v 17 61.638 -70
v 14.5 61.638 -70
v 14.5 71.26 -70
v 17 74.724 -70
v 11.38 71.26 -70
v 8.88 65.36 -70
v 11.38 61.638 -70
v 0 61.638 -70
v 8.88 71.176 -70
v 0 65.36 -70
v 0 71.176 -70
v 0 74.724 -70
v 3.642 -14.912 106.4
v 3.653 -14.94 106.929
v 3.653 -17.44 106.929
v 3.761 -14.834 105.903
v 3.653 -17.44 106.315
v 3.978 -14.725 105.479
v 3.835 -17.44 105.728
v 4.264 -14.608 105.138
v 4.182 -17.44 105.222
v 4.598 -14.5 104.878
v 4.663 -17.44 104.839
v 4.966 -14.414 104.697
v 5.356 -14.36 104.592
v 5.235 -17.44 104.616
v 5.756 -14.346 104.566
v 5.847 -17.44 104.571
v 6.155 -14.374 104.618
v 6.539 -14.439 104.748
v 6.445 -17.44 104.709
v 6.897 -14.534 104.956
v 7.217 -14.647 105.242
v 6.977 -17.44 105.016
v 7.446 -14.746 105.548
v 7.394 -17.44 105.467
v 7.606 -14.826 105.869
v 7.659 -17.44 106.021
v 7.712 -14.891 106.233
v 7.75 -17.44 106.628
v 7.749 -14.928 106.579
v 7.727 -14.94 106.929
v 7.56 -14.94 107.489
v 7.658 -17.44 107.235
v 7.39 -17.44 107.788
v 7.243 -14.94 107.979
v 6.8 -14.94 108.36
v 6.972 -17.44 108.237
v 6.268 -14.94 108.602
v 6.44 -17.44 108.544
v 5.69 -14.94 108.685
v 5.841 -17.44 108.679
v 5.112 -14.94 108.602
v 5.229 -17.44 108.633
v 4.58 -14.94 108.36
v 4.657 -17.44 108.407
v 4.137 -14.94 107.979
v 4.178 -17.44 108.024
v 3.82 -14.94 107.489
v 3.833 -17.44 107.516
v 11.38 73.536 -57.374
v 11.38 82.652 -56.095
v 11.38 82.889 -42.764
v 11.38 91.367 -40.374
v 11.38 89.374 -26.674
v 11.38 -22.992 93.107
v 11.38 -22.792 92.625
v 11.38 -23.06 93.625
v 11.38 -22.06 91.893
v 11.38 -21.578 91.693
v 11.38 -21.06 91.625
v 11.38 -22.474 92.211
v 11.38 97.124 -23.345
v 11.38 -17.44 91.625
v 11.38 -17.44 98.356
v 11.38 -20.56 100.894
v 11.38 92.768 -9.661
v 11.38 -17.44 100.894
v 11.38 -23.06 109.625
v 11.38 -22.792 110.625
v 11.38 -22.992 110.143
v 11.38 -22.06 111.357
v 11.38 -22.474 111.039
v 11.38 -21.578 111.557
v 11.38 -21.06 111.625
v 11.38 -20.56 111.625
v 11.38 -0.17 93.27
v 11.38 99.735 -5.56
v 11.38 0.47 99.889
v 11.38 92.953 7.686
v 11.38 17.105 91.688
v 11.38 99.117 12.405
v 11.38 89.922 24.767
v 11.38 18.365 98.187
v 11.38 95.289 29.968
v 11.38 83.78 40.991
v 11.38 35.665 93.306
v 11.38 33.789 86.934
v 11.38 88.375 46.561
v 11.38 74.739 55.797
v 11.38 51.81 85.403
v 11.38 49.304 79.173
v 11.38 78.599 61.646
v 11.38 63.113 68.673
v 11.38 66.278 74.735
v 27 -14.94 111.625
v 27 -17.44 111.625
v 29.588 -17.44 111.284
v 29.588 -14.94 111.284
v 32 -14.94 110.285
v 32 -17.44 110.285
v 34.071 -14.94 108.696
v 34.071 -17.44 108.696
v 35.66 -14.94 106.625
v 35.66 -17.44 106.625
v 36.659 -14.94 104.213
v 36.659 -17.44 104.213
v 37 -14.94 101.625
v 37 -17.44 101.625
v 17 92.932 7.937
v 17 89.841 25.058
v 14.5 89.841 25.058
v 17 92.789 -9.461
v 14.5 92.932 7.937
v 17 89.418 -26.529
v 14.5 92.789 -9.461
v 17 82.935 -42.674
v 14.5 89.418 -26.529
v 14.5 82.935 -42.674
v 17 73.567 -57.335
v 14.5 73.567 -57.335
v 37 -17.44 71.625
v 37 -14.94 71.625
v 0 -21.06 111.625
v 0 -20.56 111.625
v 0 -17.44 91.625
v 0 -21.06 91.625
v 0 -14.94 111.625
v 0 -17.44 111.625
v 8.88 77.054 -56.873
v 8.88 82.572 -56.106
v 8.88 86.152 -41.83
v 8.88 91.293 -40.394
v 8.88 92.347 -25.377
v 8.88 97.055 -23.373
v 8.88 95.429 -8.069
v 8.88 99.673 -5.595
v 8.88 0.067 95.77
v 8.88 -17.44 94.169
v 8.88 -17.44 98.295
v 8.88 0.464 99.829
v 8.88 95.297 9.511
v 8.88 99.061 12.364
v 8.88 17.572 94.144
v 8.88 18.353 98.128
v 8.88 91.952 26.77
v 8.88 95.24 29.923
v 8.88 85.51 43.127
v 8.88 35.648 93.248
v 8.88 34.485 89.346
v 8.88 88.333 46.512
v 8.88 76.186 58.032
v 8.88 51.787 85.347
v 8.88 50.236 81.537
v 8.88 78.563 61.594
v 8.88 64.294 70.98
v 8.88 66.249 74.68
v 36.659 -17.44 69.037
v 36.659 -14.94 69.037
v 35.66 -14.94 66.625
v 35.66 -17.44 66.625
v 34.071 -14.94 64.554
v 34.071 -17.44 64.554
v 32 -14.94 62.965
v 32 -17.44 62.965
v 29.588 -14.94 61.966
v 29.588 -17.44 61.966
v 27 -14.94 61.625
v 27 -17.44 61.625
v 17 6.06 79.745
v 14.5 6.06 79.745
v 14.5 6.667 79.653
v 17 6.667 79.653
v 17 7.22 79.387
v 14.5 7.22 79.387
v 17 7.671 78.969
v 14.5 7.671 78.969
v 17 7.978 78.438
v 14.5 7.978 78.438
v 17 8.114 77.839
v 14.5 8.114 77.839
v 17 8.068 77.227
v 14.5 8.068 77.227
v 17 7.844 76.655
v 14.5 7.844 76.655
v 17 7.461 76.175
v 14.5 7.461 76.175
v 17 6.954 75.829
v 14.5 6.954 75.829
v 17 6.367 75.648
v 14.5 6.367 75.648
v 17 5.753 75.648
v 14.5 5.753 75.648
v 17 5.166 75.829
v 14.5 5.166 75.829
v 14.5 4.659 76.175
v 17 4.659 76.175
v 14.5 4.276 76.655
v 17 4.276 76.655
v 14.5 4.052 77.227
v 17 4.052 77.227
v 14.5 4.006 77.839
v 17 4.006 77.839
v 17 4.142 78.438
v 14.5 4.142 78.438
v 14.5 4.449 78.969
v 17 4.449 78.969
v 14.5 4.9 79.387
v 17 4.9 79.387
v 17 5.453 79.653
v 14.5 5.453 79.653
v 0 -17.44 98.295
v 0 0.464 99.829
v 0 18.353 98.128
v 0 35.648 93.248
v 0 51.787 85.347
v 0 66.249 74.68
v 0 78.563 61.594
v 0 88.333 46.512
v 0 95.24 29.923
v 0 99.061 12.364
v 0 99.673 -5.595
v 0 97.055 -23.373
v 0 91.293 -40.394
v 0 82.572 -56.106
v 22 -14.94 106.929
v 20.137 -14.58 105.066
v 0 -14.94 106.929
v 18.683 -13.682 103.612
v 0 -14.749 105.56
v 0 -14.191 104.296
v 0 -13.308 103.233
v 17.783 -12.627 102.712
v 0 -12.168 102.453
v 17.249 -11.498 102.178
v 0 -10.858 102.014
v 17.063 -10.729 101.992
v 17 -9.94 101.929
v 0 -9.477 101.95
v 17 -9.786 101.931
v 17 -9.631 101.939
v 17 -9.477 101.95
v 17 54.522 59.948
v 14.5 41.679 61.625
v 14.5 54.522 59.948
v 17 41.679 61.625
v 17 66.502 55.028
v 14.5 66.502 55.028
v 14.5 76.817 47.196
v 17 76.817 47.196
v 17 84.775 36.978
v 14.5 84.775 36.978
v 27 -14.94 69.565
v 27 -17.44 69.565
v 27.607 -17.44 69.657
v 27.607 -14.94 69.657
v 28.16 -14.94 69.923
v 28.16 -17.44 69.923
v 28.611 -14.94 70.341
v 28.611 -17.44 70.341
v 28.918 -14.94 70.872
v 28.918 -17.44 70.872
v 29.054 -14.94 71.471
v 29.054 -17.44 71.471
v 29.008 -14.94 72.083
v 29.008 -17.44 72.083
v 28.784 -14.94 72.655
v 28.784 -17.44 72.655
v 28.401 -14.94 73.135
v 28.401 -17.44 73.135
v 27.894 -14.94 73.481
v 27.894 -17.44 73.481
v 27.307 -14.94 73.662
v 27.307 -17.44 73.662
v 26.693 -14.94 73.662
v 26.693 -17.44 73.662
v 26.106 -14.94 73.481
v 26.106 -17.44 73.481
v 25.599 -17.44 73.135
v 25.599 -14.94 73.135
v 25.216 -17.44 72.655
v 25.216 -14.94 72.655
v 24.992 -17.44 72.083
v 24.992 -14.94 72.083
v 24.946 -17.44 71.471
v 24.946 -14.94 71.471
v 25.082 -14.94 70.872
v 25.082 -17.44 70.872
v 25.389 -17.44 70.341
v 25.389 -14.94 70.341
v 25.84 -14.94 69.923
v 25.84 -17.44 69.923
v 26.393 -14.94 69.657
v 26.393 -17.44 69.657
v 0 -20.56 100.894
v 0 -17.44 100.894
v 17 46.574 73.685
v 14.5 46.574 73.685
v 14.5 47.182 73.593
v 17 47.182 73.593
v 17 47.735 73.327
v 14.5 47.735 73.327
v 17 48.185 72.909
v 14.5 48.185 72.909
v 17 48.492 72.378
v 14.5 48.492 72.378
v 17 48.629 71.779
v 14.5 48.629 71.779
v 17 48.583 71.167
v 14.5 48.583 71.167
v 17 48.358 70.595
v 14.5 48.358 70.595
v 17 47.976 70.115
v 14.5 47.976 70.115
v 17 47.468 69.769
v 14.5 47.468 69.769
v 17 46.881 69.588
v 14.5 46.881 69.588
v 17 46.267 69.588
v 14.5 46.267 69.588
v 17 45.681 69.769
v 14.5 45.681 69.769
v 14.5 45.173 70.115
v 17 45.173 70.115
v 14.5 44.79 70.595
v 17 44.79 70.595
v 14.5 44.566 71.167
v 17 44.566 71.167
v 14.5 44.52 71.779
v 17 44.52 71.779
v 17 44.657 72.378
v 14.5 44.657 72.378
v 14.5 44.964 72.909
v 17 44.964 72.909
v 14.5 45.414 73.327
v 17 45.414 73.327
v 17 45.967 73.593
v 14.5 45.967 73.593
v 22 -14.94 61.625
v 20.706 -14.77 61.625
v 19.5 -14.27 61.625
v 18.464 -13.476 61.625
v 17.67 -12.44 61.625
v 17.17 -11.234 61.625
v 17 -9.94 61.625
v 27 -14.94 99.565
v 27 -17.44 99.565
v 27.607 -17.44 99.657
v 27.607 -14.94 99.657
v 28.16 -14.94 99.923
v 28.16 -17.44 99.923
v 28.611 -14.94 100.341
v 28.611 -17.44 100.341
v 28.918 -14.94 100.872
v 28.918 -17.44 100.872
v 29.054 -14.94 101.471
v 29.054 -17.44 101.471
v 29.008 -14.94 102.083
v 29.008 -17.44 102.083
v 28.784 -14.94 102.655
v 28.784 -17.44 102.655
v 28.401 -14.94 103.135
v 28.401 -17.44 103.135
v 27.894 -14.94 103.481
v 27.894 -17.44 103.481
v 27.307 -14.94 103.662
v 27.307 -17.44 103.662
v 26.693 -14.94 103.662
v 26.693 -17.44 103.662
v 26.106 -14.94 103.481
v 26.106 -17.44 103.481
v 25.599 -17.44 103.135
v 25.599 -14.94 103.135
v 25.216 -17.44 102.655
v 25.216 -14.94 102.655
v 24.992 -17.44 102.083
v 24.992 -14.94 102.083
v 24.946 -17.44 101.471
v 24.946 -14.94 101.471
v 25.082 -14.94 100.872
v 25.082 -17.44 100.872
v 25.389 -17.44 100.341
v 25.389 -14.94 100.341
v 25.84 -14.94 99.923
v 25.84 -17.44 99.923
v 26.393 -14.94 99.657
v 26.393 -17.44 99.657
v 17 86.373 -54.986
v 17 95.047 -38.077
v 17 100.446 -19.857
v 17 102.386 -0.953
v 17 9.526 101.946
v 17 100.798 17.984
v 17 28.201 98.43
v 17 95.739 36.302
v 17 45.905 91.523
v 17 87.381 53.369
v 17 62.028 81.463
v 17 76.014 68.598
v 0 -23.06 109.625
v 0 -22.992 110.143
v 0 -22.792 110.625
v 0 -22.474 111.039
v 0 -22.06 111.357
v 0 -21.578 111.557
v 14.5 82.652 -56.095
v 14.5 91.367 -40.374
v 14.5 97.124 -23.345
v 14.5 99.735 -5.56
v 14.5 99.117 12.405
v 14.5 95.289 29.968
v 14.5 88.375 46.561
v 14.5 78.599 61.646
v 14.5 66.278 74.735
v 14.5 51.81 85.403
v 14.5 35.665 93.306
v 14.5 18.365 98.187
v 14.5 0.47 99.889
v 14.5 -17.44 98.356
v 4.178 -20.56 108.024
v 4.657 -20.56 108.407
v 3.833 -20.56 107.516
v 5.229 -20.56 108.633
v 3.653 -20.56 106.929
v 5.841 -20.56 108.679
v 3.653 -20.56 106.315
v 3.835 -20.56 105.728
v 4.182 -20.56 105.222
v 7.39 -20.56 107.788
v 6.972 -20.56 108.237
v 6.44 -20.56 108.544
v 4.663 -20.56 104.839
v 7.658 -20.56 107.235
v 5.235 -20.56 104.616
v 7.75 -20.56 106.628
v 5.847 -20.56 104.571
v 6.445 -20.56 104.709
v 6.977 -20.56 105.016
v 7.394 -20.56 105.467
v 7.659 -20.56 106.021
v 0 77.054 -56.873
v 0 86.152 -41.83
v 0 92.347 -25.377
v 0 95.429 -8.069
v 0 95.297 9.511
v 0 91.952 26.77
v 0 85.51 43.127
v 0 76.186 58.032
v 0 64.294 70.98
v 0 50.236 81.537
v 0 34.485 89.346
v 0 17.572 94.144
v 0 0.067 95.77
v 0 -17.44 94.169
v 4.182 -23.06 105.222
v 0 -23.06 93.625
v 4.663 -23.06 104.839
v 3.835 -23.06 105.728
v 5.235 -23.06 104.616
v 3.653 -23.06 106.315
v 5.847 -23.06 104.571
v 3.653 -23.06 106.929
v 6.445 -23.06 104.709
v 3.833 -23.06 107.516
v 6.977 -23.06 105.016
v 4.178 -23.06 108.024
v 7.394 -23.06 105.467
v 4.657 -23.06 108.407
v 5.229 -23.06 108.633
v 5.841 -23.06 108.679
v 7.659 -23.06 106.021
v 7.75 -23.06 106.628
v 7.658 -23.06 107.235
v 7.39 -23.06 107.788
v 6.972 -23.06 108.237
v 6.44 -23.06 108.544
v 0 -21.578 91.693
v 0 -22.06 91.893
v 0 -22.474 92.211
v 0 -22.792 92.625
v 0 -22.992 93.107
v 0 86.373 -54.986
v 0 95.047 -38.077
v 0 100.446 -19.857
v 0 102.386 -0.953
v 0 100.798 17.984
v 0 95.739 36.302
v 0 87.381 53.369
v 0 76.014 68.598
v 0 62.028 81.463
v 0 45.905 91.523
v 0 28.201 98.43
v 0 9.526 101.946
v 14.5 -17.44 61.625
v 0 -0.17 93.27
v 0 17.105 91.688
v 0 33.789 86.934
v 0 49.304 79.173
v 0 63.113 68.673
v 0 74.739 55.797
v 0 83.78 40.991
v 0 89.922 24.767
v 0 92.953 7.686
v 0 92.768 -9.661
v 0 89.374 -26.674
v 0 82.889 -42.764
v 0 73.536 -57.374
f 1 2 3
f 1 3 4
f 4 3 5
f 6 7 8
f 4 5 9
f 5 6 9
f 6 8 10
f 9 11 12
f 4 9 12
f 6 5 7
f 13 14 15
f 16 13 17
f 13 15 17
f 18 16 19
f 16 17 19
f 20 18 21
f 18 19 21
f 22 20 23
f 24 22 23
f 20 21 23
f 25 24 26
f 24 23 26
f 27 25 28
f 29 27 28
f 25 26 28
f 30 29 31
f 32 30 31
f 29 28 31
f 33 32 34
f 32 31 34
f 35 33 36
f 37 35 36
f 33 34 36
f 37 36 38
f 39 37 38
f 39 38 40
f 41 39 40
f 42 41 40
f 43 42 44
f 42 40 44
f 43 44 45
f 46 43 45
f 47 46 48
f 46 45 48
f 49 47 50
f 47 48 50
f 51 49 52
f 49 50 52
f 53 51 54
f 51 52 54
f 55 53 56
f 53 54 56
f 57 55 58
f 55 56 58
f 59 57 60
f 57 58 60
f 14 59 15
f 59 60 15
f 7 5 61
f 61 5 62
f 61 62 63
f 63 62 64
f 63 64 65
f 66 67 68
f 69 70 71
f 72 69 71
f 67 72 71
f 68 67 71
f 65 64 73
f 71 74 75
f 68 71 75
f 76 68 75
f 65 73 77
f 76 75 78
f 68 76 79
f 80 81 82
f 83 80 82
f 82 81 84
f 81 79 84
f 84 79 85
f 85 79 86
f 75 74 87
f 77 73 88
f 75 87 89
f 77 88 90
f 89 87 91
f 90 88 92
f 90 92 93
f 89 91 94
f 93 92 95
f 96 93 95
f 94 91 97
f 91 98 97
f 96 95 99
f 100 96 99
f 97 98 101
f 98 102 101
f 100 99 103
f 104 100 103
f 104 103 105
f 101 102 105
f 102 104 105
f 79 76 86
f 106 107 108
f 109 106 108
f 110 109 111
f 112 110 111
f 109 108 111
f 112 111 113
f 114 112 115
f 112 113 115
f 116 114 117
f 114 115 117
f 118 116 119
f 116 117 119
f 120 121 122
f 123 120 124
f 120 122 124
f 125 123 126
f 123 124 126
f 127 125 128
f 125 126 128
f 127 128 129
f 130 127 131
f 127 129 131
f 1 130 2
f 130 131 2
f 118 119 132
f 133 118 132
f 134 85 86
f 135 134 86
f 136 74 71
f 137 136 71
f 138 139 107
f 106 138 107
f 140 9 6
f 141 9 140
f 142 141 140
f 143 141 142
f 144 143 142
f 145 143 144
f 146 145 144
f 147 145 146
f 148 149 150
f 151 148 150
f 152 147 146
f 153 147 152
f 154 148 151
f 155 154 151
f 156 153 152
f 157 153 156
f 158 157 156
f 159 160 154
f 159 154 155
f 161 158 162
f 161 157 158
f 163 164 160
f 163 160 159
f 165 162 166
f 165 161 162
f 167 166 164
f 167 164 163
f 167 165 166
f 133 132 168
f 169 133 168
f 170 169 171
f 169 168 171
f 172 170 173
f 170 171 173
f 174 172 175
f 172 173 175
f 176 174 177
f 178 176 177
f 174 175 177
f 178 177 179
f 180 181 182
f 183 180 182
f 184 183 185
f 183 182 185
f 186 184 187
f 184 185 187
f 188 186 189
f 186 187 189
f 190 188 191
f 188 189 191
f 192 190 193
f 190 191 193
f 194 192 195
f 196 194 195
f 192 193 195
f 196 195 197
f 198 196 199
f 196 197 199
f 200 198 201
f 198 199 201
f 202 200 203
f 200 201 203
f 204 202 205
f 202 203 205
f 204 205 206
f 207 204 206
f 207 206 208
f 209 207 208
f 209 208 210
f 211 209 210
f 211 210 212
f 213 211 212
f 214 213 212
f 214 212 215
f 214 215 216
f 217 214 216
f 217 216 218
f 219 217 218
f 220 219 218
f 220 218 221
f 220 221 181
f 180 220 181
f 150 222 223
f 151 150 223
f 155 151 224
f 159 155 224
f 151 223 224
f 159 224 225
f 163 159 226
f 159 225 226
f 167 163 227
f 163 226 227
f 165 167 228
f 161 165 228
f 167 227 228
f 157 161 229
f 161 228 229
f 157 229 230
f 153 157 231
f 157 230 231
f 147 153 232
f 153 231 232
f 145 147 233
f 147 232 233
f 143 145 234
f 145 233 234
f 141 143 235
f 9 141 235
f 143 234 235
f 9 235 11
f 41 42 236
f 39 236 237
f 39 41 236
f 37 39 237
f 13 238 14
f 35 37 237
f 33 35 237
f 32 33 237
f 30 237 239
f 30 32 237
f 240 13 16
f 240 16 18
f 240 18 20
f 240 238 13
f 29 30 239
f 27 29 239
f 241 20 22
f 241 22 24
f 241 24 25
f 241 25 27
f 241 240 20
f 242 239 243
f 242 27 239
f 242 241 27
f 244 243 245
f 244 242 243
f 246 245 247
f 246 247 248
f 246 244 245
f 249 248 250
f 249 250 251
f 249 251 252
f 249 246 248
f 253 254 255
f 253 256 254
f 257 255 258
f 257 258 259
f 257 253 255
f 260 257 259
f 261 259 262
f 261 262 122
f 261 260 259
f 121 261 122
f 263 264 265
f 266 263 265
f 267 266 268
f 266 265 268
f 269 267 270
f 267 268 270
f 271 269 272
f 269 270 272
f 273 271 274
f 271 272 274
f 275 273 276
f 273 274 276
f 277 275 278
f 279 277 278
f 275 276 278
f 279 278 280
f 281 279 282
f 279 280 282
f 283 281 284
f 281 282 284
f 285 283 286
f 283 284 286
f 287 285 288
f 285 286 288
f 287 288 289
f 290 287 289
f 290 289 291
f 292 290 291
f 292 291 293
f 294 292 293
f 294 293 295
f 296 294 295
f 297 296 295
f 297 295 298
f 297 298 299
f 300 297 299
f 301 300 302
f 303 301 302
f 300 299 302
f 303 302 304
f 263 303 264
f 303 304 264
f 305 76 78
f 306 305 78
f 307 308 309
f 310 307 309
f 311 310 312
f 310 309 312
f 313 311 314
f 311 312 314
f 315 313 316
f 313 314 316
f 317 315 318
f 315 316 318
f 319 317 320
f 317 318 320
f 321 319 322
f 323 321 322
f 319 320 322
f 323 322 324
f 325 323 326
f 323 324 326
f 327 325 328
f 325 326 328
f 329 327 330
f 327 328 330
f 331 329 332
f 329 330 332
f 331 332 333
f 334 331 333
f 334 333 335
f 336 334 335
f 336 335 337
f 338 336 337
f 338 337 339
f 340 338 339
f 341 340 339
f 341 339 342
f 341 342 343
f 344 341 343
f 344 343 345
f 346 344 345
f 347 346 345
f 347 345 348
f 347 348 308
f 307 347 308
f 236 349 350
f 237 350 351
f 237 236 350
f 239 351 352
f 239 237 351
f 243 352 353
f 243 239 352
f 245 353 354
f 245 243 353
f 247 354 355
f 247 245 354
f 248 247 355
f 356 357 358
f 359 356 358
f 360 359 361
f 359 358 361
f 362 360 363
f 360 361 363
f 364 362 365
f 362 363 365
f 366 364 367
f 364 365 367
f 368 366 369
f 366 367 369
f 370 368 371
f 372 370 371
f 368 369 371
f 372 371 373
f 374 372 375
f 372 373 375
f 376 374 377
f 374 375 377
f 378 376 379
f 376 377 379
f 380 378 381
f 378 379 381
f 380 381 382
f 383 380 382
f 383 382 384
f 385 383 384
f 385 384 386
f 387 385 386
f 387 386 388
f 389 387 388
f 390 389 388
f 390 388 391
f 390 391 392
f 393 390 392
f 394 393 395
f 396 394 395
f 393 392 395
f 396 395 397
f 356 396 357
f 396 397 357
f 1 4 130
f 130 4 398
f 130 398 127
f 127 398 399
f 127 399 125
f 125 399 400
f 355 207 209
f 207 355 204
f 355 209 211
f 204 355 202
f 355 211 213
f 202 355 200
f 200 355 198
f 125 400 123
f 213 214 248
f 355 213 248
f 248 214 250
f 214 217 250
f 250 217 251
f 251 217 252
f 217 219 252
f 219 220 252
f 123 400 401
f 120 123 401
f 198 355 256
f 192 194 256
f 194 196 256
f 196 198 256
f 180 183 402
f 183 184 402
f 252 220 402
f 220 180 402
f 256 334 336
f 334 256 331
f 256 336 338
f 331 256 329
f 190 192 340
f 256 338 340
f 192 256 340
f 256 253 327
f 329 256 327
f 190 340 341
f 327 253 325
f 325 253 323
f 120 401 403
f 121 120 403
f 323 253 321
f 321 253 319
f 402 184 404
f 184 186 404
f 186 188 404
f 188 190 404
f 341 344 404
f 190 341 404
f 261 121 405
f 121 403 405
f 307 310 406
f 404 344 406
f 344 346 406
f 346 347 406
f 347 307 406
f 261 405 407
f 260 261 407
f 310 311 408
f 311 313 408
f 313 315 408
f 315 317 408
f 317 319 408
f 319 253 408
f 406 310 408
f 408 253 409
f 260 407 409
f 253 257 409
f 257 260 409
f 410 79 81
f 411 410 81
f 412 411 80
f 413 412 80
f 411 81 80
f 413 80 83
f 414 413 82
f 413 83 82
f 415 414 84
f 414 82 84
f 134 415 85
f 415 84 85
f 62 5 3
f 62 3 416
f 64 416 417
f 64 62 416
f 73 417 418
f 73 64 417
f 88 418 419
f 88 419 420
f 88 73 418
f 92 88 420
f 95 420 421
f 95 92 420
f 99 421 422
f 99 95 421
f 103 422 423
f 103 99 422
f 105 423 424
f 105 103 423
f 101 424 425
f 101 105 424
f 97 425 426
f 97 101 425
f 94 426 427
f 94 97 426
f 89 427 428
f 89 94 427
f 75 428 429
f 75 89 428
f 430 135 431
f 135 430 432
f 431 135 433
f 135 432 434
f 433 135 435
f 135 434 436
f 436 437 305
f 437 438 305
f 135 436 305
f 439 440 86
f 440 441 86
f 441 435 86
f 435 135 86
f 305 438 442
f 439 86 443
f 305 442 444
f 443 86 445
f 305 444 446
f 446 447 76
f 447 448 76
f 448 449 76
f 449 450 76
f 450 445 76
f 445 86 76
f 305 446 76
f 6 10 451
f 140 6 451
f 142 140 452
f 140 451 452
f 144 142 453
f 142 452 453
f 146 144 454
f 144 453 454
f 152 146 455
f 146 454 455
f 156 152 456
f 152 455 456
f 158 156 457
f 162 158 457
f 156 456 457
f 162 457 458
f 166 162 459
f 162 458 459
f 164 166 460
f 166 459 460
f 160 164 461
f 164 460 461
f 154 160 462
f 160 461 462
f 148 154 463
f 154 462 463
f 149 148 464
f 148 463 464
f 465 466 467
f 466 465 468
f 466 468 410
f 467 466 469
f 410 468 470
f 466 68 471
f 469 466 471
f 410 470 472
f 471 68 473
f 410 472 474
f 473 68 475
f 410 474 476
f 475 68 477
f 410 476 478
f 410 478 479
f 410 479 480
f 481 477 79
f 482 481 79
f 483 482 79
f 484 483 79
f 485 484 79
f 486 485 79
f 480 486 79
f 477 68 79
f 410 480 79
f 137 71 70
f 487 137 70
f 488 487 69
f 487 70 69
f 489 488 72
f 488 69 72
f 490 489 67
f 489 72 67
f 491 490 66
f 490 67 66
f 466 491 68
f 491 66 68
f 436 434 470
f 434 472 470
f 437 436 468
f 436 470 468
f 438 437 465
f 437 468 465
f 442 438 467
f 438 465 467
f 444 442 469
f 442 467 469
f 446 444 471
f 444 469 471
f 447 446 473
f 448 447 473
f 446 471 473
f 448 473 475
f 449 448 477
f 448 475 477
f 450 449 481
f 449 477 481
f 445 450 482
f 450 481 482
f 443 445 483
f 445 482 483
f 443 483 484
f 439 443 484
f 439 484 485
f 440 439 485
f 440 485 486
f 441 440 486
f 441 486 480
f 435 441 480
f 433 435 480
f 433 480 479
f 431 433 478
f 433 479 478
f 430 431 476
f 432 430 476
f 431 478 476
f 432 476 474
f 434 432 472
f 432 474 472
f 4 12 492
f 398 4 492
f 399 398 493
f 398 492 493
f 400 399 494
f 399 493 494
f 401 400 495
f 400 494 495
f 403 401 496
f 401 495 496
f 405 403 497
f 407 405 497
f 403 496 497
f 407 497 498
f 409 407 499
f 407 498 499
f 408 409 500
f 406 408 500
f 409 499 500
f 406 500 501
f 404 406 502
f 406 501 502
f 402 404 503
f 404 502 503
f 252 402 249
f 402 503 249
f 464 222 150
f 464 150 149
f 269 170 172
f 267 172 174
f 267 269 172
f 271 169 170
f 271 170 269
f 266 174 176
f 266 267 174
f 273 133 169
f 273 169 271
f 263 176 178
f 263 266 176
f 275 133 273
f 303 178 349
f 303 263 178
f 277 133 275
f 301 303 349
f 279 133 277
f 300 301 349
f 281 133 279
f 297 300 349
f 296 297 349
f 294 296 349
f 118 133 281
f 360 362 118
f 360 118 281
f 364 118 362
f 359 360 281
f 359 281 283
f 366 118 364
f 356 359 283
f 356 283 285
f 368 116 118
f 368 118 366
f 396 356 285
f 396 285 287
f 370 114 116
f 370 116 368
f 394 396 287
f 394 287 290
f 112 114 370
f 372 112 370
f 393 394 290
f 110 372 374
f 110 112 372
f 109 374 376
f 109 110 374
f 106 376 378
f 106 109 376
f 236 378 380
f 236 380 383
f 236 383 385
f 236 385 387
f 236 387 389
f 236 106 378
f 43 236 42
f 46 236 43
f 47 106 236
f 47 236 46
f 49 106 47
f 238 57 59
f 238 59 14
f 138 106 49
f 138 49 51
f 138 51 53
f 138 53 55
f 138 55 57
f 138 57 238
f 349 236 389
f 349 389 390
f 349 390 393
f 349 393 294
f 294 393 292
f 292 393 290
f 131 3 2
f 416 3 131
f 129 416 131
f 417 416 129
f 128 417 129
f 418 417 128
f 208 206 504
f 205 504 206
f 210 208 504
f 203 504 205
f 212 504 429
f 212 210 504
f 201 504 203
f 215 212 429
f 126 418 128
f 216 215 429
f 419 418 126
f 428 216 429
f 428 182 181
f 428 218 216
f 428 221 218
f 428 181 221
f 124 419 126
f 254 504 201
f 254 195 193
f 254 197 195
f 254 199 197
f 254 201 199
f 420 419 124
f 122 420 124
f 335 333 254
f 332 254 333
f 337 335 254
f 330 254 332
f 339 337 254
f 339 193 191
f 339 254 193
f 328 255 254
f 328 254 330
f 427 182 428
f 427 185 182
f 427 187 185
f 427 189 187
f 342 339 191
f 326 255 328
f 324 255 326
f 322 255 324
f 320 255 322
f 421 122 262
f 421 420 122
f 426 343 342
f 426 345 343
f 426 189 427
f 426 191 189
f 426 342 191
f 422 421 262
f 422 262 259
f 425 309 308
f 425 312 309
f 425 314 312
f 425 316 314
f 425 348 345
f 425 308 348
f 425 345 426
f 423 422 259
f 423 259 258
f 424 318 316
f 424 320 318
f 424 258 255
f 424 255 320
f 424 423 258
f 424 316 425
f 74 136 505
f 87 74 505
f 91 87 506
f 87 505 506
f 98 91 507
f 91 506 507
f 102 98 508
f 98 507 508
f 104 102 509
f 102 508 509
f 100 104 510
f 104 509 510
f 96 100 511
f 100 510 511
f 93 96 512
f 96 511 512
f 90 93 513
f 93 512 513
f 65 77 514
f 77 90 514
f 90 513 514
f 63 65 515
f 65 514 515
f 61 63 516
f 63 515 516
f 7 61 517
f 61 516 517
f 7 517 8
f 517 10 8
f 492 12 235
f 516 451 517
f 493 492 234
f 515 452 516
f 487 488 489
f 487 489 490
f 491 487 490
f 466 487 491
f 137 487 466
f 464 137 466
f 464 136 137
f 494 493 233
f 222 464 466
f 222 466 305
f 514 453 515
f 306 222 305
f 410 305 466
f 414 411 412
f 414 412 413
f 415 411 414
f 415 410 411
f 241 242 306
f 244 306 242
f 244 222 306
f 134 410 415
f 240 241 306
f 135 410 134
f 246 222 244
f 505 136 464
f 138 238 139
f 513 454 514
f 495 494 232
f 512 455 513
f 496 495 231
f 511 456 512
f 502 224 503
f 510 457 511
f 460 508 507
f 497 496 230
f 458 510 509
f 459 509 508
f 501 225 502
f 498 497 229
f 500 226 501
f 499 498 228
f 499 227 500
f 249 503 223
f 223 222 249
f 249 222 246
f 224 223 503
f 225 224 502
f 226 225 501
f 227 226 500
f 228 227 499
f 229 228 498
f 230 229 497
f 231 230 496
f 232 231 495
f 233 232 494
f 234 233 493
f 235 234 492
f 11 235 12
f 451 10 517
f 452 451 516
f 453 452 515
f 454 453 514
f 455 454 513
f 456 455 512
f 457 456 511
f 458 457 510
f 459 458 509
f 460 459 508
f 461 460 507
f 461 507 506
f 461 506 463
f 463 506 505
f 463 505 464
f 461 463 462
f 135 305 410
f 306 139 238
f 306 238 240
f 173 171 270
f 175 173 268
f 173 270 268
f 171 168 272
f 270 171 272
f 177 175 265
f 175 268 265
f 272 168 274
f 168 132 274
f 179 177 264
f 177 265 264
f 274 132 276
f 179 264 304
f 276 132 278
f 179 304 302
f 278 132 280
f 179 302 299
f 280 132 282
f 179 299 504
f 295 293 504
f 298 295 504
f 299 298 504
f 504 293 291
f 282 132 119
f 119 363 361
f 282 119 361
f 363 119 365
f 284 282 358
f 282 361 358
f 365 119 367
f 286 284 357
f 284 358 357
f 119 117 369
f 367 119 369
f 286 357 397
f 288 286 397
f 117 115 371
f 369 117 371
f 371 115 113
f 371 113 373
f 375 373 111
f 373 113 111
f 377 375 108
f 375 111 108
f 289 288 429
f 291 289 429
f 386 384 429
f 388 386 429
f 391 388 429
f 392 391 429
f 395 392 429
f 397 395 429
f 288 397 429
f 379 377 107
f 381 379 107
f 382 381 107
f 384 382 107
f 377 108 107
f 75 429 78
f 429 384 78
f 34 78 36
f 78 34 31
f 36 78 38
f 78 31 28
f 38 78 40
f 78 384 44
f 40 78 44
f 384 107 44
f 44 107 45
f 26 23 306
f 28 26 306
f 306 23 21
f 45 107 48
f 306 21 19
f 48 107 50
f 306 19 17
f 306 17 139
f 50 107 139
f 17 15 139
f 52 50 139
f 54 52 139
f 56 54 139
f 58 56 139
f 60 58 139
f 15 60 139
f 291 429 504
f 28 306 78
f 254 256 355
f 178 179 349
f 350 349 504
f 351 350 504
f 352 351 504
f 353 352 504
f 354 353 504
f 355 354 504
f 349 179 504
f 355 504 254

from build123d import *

# Parameters (mm, degrees)
SALIENTE_EXTRUIR1_DEPTH = 17
CORTAR_EXTRUIR1_DEPTH   = 8.88
CORTAR_EXTRUIR2_START   = -5.62
CROQUIS6_R              = 99.89
CROQUIS6_R_2            = 93.27
CORTAR_EXTRUIR2_DEPTH   = 3.12
SALIENTE_EXTRUIR3_DEPTH = 17
SALIENTE_EXTRUIR4_START = -5.62
SALIENTE_EXTRUIR4_DEPTH = 11.38
SALIENTE_EXTRUIR5_START = -2.5
SALIENTE_EXTRUIR5_DEPTH = 2.5
REDONDEO1_R             = 50
CROQUIS7_R              = 2.06
SALIENTE_EXTRUIR6_DEPTH = 2.5
REDONDEO7_R             = 5
CROQUIS8_R              = 2.06
CORTAR_EXTRUIR3_DEPTH   = 172.950113436
CROQUIS9_R              = 2.06
CORTAR_EXTRUIR4_DEPTH   = 154.134258449


with BuildPart() as part:
    # Croquis1 → Saliente-Extruir1 (new body)
    with BuildSketch(Plane(origin=(0, 0, 0), x_dir=(0, 0, -1), z_dir=(1, 0, 0))):
        with BuildLine():
            ThreePointArc((70, 74.724240378), (-48.602144929, 90.119607235), (-100.893798125, -17.44))
            Line((-100.893798125, -17.44), (-91.624992769, -17.44))
            ThreePointArc((-91.624992769, -17.44), (-40.990957413, 83.779677192), (70, 61.638404425))
            Line((70, 61.638404425), (70, 74.724240378))
        make_face()
    extrude(amount=SALIENTE_EXTRUIR1_DEPTH)

    # Croquis5 → Cortar-Extruir1 (cut)
    with BuildSketch(Plane.ZY):
        with BuildLine():
            Line((-70, 71.176041615), (-70, 65.359719247))
            ThreePointArc((-70, 65.359719247), (43.12748064, 85.509726427), (94.168674728, -17.44))
            Line((94.168674728, -17.44), (98.294838623, -17.44))
            ThreePointArc((98.294838623, -17.44), (46.5118284, 88.332772621), (-70, 71.176041615))
        make_face()
    extrude(amount=-CORTAR_EXTRUIR1_DEPTH, mode=Mode.SUBTRACT)

    # Croquis6 → Cortar-Extruir2 (cut)
    with BuildSketch(Plane(origin=(17, 0, 0), x_dir=(0, 0, -1), z_dir=(1, 0, 0)).offset(CORTAR_EXTRUIR2_START)):
        Circle(CROQUIS6_R)
        Circle(CROQUIS6_R_2, mode=Mode.SUBTRACT)
    extrude(amount=CORTAR_EXTRUIR2_DEPTH, mode=Mode.SUBTRACT)

    # Croquis2 → Saliente-Extruir3 (add, through all)
    with BuildSketch(Plane(origin=(17, 0, 0), x_dir=(0, 0, -1), z_dir=(1, 0, 0))):
        with BuildLine():
            Line((-111.624992769, -14.94), (-111.624992769, -17.44))
            Line((-111.624992769, -17.44), (-100.893798125, -17.44))
            ThreePointArc((-100.893798125, -17.44), (-101.101710796, -16.19123757), (-101.294168144, -14.94))
            Line((-101.294168144, -14.94), (-111.624992769, -14.94))
        make_face()
    extrude(amount=-SALIENTE_EXTRUIR3_DEPTH)

    # Croquis3 → Saliente-Extruir4 (add)
    with BuildSketch(Plane(origin=(17, 0, 0), x_dir=(0, 0, -1), z_dir=(1, 0, 0)).offset(SALIENTE_EXTRUIR4_START)):
        with BuildLine():
            Line((-91.624992769, -17.44), (-91.624992769, -21.06))
            ThreePointArc((-91.624992769, -21.06), (-92.210779207, -22.474213562), (-93.624992769, -23.06))
            Line((-93.624992769, -23.06), (-109.624992769, -23.06))
            ThreePointArc((-109.624992769, -23.06), (-111.039206332, -22.474213562), (-111.624992769, -21.06))
            Line((-111.624992769, -21.06), (-111.624992769, -20.56))
            Line((-111.624992769, -20.56), (-100.893798125, -20.56))
            Line((-100.893798125, -20.56), (-100.893798125, -17.44))
            Line((-100.893798125, -17.44), (-91.624992769, -17.44))
        make_face()
    extrude(amount=-SALIENTE_EXTRUIR4_DEPTH)

    # Croquis4 → Saliente-Extruir5 (add)
    with BuildSketch(Plane(origin=(17, 0, 0), x_dir=(0, 0, -1), z_dir=(1, 0, 0)).offset(SALIENTE_EXTRUIR5_START)):
        with BuildLine():
            Line((-61.624992769, 70.011807334), (-61.624992769, -17.44))
            Line((-61.624992769, -17.44), (-91.624992769, -17.44))
            ThreePointArc((-91.624992769, -17.44), (-88.223263193, 30.264644911), (-61.624992769, 70.011807334))
        make_face()
    extrude(amount=SALIENTE_EXTRUIR5_DEPTH)

    # Redondeo1
    redondeo1_edges = [part.edges().sort_by_distance(p)[0] for p in [
        (15.75, 70.011807334, 61.624992769),
    ]]
    fillet(redondeo1_edges, radius=REDONDEO1_R)

    # Croquis7 → Saliente-Extruir6 (add)
    with BuildSketch(Plane.XZ.offset(17.44)):
        with BuildLine():
            Line((17, 111.624992769), (27, 111.624992769))
            ThreePointArc((27, 111.624992769), (34.071067812, 108.696060581), (37, 101.624992769))
            Line((37, 101.624992769), (37, 71.624992769))
            ThreePointArc((37, 71.624992769), (34.071067812, 64.553924958), (27, 61.624992769))
            Line((27, 61.624992769), (17, 61.624992769))
            Line((17, 61.624992769), (17, 111.624992769))
        make_face()
        with Locations(Location((27, 101.624992769, 0), (0, 0, 270))):
            Circle(CROQUIS7_R, mode=Mode.SUBTRACT)
        with Locations(Location((27, 71.624992769, 0), (0, 0, 270))):
            Circle(CROQUIS7_R, mode=Mode.SUBTRACT)
    extrude(amount=-SALIENTE_EXTRUIR6_DEPTH)

    # Redondeo7
    redondeo7_edges = [part.edges().sort_by_distance(p)[0] for p in [
        (17, -14.94, 81.459580457),
        (8.5, -14.94, 101.294168144),
    ]]
    fillet(redondeo7_edges, radius=REDONDEO7_R)

    # Croquis8 → Cortar-Extruir3 (cut, through all)
    with BuildSketch(Plane.XZ.offset(23.06)):
        with Locations(Location((5.69, 106.624992769, 0), (0, 0, 171.513837035))):
            Circle(CROQUIS8_R)
    extrude(amount=-CORTAR_EXTRUIR3_DEPTH, mode=Mode.SUBTRACT)

    # Croquis9 → Cortar-Extruir4 (cut, through all)
    with BuildSketch(Plane.ZY.offset(-14.5)):
        with Locations((77.684992769, 6.06)):
            Circle(CROQUIS9_R)
        with Locations((71.624992769, 46.574468299)):
            Circle(CROQUIS9_R)
    extrude(amount=-CORTAR_EXTRUIR4_DEPTH, mode=Mode.SUBTRACT)


solid = part.part
